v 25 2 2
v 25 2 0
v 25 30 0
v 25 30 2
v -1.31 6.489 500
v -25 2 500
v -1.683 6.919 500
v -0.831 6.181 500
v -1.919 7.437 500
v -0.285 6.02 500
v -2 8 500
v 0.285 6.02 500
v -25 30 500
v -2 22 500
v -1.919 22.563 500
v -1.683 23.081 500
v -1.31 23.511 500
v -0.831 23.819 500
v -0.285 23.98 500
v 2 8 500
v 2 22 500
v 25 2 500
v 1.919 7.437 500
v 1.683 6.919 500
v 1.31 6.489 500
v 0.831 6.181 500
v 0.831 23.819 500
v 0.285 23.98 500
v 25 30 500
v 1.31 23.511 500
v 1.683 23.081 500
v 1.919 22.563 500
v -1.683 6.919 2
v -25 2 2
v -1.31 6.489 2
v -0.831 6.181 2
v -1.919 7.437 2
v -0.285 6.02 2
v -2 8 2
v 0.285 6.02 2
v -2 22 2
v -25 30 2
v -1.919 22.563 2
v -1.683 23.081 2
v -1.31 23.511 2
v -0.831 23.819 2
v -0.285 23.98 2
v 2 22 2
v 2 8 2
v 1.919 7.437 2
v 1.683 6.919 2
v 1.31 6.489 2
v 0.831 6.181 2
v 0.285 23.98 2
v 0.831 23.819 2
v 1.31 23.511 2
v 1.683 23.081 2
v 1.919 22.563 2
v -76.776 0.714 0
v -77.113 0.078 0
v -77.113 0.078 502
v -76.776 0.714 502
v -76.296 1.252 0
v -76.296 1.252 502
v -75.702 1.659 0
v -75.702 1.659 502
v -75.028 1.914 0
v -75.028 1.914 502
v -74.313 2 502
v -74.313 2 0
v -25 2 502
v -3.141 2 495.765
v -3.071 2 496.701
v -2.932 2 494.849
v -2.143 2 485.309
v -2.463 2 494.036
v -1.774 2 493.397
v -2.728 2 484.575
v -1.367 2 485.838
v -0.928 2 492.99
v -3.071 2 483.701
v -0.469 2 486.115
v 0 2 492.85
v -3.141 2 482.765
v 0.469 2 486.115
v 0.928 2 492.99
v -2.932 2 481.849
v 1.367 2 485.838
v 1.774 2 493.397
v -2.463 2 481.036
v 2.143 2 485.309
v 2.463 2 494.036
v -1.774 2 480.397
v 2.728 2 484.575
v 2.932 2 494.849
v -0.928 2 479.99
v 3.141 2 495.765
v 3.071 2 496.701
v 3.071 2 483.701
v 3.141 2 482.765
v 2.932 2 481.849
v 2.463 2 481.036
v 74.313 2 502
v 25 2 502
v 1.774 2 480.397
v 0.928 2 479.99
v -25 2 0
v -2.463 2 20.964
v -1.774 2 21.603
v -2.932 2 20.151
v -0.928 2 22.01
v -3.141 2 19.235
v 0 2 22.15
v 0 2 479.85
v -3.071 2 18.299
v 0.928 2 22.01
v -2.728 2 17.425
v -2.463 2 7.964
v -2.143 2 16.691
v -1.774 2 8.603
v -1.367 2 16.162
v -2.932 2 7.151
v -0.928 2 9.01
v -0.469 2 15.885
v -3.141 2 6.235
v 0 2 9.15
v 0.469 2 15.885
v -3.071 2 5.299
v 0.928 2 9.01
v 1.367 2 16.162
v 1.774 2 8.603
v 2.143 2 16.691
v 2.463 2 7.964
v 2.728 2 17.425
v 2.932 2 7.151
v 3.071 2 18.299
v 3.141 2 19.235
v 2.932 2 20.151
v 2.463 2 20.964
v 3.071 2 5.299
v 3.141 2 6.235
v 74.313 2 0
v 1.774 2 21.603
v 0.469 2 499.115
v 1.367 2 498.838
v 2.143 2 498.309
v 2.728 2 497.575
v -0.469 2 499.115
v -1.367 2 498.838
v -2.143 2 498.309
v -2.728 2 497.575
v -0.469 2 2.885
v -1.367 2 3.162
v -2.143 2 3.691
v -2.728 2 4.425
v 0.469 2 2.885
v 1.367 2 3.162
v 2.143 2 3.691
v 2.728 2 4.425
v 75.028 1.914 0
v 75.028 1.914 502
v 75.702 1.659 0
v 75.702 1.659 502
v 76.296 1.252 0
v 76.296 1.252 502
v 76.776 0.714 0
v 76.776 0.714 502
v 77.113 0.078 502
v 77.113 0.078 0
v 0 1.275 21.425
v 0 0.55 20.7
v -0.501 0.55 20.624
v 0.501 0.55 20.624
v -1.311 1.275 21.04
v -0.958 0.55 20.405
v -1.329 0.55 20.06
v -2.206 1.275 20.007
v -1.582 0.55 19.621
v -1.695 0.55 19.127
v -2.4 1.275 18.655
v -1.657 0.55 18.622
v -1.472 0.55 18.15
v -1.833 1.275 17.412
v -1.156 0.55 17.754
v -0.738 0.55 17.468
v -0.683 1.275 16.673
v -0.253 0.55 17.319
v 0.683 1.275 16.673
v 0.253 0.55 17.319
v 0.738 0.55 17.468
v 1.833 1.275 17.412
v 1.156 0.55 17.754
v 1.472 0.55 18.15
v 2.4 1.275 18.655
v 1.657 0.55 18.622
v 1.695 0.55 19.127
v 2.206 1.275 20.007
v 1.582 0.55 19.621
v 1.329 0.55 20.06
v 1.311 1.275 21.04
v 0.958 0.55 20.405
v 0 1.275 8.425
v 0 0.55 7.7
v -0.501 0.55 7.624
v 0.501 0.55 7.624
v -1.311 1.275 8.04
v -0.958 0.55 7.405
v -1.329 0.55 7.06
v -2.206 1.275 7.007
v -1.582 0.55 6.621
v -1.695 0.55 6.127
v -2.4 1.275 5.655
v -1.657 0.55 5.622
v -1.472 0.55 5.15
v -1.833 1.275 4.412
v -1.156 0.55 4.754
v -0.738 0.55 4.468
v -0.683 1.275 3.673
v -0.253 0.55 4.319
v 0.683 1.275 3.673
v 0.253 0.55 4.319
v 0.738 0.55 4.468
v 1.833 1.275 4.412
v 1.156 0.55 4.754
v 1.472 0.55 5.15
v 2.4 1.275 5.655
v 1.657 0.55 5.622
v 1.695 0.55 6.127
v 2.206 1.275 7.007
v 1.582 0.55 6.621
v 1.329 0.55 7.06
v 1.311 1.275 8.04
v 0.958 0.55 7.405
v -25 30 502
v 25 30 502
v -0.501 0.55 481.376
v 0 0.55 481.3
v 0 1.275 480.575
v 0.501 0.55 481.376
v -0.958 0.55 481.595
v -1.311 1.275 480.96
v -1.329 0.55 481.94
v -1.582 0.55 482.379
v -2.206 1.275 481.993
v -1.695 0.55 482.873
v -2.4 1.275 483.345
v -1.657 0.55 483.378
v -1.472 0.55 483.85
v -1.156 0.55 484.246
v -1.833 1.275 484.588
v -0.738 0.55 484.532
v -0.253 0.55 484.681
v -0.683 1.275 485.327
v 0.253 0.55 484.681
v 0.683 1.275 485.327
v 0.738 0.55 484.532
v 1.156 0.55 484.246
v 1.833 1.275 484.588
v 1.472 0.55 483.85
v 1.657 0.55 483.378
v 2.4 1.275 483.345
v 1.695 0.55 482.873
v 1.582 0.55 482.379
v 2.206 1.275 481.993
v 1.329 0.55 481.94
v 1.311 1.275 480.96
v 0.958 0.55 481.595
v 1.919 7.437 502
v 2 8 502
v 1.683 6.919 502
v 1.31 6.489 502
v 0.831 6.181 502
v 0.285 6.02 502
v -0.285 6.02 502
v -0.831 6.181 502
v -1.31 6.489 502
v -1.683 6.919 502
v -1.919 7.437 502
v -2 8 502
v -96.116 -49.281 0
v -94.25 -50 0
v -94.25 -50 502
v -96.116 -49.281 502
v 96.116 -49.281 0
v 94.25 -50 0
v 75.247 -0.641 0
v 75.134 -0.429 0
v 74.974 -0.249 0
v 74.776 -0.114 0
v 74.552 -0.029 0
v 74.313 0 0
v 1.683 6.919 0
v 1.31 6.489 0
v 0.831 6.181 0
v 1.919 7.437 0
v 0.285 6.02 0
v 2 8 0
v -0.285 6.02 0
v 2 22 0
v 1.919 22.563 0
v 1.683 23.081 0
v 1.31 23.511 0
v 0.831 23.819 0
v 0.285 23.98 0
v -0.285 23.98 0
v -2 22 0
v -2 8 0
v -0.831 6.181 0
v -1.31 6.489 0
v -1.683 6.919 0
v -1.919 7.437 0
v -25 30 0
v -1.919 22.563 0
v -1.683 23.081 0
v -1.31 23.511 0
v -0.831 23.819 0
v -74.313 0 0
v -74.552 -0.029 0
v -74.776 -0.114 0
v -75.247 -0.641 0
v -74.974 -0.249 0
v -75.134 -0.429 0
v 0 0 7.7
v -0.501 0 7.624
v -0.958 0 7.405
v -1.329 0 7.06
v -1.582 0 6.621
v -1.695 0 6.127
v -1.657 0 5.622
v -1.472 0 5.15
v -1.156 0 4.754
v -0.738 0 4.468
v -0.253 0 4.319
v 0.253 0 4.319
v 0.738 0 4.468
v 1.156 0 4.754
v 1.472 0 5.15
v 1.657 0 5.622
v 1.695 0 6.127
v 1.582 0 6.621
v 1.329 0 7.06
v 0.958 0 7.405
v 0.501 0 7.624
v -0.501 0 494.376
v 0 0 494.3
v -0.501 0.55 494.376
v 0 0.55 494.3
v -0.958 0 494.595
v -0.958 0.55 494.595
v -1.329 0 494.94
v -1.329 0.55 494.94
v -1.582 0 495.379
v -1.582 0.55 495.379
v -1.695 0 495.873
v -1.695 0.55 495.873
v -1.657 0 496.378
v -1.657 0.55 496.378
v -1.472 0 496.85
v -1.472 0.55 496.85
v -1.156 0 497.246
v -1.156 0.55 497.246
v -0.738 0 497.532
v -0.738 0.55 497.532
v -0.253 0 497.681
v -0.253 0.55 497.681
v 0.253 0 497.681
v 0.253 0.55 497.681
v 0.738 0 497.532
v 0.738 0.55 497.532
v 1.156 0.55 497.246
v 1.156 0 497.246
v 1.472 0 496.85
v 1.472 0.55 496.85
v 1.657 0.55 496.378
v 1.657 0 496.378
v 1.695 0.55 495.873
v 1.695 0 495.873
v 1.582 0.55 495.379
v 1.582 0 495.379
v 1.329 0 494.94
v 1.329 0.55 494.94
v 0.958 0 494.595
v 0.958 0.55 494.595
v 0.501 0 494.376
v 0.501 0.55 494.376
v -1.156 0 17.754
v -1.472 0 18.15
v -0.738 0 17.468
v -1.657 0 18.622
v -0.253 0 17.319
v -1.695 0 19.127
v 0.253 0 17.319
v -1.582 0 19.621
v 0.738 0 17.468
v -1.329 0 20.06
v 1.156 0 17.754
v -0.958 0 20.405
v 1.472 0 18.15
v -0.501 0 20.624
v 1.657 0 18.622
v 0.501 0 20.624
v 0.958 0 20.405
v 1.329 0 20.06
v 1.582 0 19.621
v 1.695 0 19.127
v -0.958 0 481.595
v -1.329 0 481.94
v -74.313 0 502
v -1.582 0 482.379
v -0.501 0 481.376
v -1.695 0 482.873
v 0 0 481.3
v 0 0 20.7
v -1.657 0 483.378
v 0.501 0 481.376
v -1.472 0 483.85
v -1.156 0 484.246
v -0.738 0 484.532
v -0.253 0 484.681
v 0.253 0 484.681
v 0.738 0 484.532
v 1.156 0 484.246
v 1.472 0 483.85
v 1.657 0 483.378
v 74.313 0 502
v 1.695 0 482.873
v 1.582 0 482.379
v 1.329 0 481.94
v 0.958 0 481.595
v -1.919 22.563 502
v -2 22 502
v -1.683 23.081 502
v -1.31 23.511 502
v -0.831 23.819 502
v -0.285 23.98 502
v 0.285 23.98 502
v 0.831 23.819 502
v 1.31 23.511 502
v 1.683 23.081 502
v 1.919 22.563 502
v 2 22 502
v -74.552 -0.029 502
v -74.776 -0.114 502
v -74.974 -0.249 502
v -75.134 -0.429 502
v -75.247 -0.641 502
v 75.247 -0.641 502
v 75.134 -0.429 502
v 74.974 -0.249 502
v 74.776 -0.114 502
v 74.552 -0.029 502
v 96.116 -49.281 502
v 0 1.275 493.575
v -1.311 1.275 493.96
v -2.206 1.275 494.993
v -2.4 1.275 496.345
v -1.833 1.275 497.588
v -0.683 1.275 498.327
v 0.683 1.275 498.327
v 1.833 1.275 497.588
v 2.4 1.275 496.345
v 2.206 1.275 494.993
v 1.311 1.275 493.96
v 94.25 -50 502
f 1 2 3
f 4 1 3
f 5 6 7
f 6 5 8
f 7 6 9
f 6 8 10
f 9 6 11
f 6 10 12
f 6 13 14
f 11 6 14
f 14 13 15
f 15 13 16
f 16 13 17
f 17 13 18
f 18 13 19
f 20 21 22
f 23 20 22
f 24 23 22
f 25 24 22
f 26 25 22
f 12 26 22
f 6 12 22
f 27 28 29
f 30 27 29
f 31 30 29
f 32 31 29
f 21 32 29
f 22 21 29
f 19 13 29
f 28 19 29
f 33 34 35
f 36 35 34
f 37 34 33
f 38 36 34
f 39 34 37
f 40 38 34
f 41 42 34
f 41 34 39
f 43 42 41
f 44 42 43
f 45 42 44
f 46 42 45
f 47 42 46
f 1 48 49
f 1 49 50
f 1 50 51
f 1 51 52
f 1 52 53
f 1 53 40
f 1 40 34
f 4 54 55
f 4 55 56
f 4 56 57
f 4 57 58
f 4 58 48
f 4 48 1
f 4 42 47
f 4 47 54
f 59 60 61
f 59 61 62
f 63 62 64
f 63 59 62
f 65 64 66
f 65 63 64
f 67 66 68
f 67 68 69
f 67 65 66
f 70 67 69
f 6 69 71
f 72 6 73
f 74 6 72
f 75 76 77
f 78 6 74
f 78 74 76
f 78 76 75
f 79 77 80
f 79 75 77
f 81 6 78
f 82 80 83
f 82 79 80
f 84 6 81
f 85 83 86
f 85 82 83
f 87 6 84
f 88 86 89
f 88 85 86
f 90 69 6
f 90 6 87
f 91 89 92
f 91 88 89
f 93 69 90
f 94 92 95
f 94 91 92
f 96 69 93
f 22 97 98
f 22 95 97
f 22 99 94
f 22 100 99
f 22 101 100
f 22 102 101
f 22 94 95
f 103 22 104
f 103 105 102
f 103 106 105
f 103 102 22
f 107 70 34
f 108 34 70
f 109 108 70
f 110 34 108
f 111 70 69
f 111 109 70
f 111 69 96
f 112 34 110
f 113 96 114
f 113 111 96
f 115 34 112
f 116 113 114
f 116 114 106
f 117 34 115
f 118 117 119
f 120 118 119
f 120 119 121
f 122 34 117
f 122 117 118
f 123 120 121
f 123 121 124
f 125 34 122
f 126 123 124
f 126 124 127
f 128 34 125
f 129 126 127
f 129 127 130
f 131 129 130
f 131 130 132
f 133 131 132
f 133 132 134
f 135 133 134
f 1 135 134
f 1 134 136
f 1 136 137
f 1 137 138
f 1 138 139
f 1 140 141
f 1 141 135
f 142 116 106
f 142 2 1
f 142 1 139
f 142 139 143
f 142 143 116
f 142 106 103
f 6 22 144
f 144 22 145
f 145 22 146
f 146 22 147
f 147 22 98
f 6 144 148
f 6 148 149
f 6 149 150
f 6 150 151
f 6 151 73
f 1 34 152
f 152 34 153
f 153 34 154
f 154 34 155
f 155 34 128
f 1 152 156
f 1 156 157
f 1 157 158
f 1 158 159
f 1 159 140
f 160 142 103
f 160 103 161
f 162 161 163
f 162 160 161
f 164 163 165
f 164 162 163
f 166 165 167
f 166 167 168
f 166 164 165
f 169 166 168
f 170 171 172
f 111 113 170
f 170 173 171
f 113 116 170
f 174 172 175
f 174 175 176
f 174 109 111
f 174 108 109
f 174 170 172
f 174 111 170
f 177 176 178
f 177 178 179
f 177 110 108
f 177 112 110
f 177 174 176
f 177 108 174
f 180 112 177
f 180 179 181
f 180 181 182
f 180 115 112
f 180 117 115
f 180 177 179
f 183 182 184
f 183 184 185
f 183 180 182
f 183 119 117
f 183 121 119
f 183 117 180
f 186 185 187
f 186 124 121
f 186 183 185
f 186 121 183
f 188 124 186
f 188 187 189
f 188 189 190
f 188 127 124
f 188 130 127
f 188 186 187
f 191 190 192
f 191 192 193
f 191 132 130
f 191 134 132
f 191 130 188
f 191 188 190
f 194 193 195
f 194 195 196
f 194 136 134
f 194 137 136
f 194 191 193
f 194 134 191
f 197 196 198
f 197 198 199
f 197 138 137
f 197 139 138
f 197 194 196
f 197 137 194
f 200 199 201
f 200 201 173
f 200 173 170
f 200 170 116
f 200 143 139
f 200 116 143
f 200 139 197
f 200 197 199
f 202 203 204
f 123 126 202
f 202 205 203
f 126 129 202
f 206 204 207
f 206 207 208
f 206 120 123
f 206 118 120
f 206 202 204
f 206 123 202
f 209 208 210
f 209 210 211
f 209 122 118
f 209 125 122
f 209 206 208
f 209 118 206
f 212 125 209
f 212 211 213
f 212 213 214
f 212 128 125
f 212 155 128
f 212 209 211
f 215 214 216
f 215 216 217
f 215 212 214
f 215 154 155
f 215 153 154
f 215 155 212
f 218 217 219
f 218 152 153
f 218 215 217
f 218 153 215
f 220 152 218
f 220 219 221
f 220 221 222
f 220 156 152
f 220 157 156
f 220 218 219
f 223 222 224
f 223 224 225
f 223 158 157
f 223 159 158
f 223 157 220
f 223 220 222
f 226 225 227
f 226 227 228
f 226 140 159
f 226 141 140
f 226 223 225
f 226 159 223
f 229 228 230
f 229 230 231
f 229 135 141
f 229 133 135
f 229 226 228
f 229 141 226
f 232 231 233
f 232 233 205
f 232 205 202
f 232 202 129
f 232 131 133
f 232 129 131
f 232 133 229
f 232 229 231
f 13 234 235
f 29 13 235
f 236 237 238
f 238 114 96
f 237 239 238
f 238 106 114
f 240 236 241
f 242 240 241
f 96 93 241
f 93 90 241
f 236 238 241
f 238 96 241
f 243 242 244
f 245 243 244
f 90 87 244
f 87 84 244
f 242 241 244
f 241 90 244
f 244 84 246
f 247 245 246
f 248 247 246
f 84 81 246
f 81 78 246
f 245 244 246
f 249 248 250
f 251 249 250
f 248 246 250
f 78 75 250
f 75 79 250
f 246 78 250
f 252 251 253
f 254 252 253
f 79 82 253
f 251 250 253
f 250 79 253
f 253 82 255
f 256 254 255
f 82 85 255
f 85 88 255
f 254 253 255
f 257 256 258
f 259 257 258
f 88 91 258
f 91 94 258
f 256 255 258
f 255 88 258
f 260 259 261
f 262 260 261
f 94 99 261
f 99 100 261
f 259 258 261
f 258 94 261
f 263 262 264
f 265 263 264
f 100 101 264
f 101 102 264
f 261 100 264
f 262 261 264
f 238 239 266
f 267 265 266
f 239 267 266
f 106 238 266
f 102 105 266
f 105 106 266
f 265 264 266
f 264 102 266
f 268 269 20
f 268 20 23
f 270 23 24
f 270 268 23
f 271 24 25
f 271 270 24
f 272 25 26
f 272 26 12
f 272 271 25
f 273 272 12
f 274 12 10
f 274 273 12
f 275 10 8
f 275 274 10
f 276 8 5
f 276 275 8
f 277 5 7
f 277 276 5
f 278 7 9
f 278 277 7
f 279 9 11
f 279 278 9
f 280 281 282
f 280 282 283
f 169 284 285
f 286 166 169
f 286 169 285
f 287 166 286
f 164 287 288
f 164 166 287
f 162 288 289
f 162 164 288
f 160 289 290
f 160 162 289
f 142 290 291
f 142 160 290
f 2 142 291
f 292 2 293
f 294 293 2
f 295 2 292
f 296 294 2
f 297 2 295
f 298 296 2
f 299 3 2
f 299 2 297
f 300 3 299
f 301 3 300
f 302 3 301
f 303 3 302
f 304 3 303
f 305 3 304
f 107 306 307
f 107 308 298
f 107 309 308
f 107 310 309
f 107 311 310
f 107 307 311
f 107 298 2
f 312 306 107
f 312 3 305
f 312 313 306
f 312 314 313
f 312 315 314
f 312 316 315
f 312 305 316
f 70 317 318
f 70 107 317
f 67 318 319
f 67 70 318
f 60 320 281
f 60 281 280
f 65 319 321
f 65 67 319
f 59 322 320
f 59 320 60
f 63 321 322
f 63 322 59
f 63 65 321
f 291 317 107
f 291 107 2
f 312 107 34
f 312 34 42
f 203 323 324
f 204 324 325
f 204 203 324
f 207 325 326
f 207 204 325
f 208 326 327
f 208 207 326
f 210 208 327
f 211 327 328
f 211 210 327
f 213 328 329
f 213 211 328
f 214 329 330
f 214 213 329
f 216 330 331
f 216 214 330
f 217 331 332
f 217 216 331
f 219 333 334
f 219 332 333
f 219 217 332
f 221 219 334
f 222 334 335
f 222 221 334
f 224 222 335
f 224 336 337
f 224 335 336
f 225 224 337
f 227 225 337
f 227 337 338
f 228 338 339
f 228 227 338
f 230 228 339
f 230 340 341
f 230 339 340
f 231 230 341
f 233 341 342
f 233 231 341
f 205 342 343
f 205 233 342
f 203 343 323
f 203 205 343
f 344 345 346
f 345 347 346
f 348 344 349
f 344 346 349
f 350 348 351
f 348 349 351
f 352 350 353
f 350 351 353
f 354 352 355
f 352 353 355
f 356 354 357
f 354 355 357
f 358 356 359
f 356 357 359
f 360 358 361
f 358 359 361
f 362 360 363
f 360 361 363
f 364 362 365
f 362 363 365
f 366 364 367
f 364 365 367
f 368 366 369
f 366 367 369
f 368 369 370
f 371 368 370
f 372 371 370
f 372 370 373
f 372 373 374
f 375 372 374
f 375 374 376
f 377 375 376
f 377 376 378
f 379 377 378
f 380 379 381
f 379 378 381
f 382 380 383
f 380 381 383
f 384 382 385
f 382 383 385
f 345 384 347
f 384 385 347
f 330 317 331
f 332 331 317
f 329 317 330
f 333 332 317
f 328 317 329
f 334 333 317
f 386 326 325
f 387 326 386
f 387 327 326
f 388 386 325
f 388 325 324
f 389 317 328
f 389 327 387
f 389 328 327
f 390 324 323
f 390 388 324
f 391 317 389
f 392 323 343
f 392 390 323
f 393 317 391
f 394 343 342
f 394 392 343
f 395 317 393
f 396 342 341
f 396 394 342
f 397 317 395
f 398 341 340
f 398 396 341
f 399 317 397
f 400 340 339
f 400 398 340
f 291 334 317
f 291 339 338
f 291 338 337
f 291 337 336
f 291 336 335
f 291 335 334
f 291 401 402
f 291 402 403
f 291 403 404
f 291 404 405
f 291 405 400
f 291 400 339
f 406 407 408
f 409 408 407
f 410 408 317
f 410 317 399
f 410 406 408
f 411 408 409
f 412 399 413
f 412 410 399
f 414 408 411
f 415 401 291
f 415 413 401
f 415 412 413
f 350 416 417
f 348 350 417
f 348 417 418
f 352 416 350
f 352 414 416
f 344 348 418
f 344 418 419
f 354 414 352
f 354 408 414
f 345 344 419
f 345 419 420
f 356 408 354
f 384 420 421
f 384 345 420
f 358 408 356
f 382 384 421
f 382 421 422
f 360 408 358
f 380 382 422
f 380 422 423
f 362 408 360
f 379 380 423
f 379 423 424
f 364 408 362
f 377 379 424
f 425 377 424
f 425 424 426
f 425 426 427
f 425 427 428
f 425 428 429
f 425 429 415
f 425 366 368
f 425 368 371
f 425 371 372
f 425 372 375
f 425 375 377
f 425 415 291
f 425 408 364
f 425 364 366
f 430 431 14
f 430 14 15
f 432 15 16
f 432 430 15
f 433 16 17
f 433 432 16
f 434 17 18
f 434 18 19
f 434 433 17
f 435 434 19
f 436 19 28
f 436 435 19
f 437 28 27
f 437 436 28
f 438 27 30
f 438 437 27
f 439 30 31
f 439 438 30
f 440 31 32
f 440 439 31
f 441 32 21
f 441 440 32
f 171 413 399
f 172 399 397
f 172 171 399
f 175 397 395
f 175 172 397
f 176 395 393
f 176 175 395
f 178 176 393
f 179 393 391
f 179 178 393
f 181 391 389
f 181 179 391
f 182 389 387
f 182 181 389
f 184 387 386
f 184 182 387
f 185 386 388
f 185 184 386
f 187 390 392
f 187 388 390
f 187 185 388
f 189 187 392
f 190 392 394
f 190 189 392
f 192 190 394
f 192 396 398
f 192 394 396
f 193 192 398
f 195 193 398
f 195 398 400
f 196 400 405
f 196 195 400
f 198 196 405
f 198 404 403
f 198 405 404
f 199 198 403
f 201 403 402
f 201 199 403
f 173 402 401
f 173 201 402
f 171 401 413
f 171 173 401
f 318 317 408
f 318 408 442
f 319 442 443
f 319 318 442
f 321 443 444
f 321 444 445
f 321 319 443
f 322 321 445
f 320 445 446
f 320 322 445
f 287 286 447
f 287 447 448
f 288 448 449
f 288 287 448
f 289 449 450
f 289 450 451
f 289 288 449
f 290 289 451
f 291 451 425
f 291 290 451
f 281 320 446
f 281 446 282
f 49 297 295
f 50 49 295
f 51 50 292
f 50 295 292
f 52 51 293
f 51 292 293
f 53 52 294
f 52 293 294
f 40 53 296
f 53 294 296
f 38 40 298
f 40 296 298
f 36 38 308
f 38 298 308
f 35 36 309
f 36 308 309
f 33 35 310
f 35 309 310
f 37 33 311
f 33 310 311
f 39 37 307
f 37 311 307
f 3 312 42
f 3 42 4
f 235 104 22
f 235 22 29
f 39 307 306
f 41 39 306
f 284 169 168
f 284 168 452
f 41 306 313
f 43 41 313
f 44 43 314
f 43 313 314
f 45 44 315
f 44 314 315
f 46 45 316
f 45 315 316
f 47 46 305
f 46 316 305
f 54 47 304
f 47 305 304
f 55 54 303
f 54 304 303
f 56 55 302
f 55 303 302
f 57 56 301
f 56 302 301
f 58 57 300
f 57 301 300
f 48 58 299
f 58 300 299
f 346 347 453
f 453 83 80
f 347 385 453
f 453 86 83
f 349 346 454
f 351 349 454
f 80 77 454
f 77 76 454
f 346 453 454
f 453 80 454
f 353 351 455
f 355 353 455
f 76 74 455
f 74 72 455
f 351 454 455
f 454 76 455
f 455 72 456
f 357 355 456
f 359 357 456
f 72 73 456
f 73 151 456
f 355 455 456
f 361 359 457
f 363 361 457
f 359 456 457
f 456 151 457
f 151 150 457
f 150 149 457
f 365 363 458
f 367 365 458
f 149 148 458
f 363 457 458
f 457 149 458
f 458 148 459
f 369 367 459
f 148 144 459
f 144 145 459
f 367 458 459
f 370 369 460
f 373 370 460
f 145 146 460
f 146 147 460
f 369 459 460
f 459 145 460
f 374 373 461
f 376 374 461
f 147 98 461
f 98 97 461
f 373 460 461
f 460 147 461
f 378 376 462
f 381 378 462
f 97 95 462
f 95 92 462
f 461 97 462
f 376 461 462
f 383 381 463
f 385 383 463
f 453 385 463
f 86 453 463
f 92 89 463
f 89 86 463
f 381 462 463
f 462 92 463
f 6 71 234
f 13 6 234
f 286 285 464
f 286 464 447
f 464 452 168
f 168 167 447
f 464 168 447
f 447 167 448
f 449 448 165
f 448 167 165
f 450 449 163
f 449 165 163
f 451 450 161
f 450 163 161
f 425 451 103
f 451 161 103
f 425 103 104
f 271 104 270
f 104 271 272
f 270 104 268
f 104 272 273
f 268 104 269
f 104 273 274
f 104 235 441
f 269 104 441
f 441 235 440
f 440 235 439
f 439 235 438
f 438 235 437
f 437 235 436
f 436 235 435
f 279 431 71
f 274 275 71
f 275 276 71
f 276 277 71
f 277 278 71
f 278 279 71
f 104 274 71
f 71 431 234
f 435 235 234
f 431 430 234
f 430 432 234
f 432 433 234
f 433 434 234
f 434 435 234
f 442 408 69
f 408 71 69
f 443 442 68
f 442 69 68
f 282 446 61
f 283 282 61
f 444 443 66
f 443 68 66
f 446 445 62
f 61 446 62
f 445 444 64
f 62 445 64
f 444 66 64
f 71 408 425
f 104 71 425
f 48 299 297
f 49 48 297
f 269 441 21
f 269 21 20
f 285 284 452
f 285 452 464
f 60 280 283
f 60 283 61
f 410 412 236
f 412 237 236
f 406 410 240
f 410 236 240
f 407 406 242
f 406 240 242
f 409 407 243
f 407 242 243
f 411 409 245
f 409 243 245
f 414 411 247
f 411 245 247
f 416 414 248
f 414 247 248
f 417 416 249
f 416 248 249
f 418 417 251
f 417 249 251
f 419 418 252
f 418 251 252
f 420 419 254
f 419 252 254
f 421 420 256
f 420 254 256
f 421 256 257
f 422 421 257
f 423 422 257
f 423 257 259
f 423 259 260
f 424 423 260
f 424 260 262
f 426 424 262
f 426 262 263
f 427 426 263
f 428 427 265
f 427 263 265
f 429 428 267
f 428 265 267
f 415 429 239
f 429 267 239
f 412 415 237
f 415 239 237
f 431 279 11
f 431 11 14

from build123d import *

# Parameters (mm, degrees)
EXTRUDE_THIN1_DEPTH                          = 502
SKETCH3_W                                    = 50
SKETCH3_H                                    = 30
BOSS_EXTRUDE1_DEPTH                          = 2
CSK_FOR_M3_COUNTERSUNK_FLAT_HEAD_SCR_2_COUNT = 2
CSK_FOR_M3_COUNTERSUNK_FLAT_HEAD_SCR_2_PITCH = 13


with BuildPart() as part:
    # Sketch1 → Extrude-Thin1 (new body)
    with BuildSketch(Plane.XY):
        with BuildLine():
            Line((94.25, -50), (75.246672681, -0.640708262))
            ThreePointArc((75.246672681, -0.640708262), (74.879445737, -0.175593626), (74.313447388, 0))
            Line((74.313447388, 0), (-74.313447388, 0))
            ThreePointArc((-74.313447388, 0), (-74.879445737, -0.175593626), (-75.246672681, -0.640708262))
            Line((-75.246672681, -0.640708262), (-94.25, -50))
            Line((-94.25, -50), (-96.116450586, -49.281416525))
            Line((-96.116450586, -49.281416525), (-77.113123267, 0.077875213))
            ThreePointArc((-77.113123267, 0.077875213), (-76.011442435, 1.473219121), (-74.313447388, 2))
            Line((-74.313447388, 2), (74.313447388, 2))
            ThreePointArc((74.313447388, 2), (76.011442435, 1.473219121), (77.113123267, 0.077875213))
            Line((77.113123267, 0.077875213), (96.116450586, -49.281416525))
            Line((96.116450586, -49.281416525), (94.25, -50))
        make_face()
    extrude(amount=EXTRUDE_THIN1_DEPTH)

    # Sketch3 → Boss-Extrude1 (add)
    with BuildSketch(Plane.XY.offset(502)):
        with Locations((0, 15)):
            Rectangle(SKETCH3_W, SKETCH3_H)
        with BuildLine():
            Line((2, 22), (2, 8))
            ThreePointArc((2, 8), (0, 6), (-2, 8))
            Line((-2, 8), (-2, 22))
            ThreePointArc((-2, 22), (0, 24), (2, 22))
        make_face(mode=Mode.SUBTRACT)
    extrude(amount=-BOSS_EXTRUDE1_DEPTH)

    # Mirror1: part across plane


with BuildPart() as part_1:
    add(part.part)
    add(part.part.mirror(Plane.XY.offset(251)))

    # Sketch5 → CSK for M3 Countersunk Flat Head Screw1 (revolve, cut)
    with BuildSketch(Plane(origin=(0, 2, 19), x_dir=(0, 0, 1), z_dir=(1, 0, 0))):
        Polygon((0, 0), (0, 26.021463052), (1.7, 25), (1.7, 1.45), (3.15, 0), align=None)
    csk_for_m3_countersunk_flat_head_screw1 = revolve(axis=Axis((0, 8.35, 19), (0, -1, 0)), mode=Mode.SUBTRACT)

    # CSK for M3 Countersunk Flat Head Scr 2: CSK for M3 Countersunk Flat Head Screw1 ×2
    with Locations(*[(0, 0, -i * CSK_FOR_M3_COUNTERSUNK_FLAT_HEAD_SCR_2_PITCH) for i in range(1, CSK_FOR_M3_COUNTERSUNK_FLAT_HEAD_SCR_2_COUNT)]):
        add(csk_for_m3_countersunk_flat_head_screw1, mode=Mode.SUBTRACT)

    # Mirror2: CSK for M3 Countersunk Flat Head Screw1 across plane
    add(csk_for_m3_countersunk_flat_head_screw1.mirror(Plane.XY.offset(251)), mode=Mode.SUBTRACT)

    # Mirror2 copy 1 sketch → Mirror2 copy 1 (revolve, cut)
    with BuildSketch(Plane(origin=(0, 2, 496), x_dir=(0, 0, -1), z_dir=(1, 0, 0))):
        Polygon((0, 0), (0, -26.021463052), (1.7, -25), (1.7, -1.45), (3.15, 0), align=None)
    revolve(axis=Axis((0, 8.35, 496), (0, 1, 0)), mode=Mode.SUBTRACT)


solid = part_1.part
